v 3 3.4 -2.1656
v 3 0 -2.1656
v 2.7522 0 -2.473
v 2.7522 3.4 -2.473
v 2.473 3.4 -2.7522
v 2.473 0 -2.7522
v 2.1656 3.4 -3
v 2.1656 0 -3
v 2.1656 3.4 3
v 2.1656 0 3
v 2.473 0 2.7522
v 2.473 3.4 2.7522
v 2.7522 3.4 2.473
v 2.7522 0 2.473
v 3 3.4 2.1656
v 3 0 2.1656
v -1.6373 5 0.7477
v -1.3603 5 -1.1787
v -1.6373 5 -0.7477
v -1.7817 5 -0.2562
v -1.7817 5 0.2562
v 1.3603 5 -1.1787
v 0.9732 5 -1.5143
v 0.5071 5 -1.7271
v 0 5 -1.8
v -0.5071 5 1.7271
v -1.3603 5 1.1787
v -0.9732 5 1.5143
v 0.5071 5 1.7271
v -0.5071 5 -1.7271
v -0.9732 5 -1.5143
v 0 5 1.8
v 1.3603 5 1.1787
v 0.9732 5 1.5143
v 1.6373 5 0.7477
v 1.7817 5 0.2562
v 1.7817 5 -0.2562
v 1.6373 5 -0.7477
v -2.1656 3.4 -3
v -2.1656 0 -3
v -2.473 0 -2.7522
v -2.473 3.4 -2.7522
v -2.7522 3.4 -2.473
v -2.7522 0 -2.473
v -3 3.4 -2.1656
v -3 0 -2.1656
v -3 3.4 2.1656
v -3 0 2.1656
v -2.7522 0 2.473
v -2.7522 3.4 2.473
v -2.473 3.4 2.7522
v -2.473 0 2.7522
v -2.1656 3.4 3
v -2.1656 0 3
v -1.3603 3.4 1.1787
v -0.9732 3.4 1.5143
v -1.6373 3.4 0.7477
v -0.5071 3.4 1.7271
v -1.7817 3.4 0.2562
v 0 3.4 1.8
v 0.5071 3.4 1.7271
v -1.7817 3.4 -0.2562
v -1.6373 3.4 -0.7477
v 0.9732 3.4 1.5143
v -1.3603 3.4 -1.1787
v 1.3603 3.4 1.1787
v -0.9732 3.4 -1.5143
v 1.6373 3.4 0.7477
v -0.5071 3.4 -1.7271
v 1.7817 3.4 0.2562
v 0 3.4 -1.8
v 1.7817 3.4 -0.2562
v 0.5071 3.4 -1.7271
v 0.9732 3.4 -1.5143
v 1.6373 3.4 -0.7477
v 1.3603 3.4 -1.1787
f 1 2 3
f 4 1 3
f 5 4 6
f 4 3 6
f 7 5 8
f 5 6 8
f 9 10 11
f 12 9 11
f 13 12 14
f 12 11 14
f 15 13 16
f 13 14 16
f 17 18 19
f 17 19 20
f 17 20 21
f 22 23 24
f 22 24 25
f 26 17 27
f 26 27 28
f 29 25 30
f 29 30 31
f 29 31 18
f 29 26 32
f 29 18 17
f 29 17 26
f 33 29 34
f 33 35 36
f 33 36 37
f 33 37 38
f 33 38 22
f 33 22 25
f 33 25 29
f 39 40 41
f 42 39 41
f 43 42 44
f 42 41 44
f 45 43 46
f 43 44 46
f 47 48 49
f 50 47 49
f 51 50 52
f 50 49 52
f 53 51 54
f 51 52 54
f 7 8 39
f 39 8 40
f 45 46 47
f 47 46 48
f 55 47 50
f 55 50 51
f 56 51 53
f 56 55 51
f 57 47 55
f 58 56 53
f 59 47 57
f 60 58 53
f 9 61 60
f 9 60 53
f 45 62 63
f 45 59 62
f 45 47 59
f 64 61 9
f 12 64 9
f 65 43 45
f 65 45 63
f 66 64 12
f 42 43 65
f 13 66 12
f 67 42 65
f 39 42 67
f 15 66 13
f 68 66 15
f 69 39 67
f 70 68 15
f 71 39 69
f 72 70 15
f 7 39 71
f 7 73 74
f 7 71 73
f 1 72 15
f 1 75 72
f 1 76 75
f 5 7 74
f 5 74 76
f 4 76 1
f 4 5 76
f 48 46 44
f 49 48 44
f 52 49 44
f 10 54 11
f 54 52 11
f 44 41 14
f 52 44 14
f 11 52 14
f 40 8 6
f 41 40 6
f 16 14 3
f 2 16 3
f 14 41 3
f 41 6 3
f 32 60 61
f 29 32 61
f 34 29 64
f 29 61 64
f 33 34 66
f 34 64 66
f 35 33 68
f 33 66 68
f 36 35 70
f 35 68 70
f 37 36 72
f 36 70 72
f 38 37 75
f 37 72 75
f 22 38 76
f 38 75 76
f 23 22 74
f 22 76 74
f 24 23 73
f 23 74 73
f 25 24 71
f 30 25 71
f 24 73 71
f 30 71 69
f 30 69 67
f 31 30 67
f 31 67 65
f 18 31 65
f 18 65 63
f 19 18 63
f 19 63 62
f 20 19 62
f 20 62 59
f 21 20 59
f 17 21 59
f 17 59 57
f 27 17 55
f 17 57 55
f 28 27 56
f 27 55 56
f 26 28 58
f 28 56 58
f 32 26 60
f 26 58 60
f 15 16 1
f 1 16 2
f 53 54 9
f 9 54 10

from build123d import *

# Parameters (mm, degrees)
BOSS_EXTRUDE1_DEPTH = 3.4
SKETCH3_R           = 1.8
BOSS_EXTRUDE2_DEPTH = 1.6


with BuildPart() as part:
    # Sketch2 → Boss-Extrude1 (new body)
    with BuildSketch(Plane(origin=(0, 0, 0), x_dir=(1, 0, 0), z_dir=(0, 1, 0))):
        with BuildLine():
            Line((-2.165640783, -3), (2.165640783, -3))
            ThreePointArc((2.165640783, -3), (2.61629509, -2.61629509), (3, -2.165640783))
            Line((3, -2.165640783), (3, 2.165640783))
            ThreePointArc((3, 2.165640783), (2.61629509, 2.61629509), (2.165640783, 3))
            Line((2.165640783, 3), (-2.165640783, 3))
            ThreePointArc((-2.165640783, 3), (-2.61629509, 2.61629509), (-3, 2.165640783))
            Line((-3, 2.165640783), (-3, -2.165640783))
            ThreePointArc((-3, -2.165640783), (-2.61629509, -2.61629509), (-2.165640783, -3))
        make_face()
    extrude(amount=BOSS_EXTRUDE1_DEPTH)

    # Sketch3 → Boss-Extrude2 (add)
    with BuildSketch(Plane(origin=(0, 3.4, 0), x_dir=(1, 0, 0), z_dir=(0, 1, 0))):
        with Locations(Location((0, 0, 0), (0, 0, 270))):  # turned: the seam where the file's is
            Circle(SKETCH3_R)
    extrude(amount=BOSS_EXTRUDE2_DEPTH)


solid = part.part
